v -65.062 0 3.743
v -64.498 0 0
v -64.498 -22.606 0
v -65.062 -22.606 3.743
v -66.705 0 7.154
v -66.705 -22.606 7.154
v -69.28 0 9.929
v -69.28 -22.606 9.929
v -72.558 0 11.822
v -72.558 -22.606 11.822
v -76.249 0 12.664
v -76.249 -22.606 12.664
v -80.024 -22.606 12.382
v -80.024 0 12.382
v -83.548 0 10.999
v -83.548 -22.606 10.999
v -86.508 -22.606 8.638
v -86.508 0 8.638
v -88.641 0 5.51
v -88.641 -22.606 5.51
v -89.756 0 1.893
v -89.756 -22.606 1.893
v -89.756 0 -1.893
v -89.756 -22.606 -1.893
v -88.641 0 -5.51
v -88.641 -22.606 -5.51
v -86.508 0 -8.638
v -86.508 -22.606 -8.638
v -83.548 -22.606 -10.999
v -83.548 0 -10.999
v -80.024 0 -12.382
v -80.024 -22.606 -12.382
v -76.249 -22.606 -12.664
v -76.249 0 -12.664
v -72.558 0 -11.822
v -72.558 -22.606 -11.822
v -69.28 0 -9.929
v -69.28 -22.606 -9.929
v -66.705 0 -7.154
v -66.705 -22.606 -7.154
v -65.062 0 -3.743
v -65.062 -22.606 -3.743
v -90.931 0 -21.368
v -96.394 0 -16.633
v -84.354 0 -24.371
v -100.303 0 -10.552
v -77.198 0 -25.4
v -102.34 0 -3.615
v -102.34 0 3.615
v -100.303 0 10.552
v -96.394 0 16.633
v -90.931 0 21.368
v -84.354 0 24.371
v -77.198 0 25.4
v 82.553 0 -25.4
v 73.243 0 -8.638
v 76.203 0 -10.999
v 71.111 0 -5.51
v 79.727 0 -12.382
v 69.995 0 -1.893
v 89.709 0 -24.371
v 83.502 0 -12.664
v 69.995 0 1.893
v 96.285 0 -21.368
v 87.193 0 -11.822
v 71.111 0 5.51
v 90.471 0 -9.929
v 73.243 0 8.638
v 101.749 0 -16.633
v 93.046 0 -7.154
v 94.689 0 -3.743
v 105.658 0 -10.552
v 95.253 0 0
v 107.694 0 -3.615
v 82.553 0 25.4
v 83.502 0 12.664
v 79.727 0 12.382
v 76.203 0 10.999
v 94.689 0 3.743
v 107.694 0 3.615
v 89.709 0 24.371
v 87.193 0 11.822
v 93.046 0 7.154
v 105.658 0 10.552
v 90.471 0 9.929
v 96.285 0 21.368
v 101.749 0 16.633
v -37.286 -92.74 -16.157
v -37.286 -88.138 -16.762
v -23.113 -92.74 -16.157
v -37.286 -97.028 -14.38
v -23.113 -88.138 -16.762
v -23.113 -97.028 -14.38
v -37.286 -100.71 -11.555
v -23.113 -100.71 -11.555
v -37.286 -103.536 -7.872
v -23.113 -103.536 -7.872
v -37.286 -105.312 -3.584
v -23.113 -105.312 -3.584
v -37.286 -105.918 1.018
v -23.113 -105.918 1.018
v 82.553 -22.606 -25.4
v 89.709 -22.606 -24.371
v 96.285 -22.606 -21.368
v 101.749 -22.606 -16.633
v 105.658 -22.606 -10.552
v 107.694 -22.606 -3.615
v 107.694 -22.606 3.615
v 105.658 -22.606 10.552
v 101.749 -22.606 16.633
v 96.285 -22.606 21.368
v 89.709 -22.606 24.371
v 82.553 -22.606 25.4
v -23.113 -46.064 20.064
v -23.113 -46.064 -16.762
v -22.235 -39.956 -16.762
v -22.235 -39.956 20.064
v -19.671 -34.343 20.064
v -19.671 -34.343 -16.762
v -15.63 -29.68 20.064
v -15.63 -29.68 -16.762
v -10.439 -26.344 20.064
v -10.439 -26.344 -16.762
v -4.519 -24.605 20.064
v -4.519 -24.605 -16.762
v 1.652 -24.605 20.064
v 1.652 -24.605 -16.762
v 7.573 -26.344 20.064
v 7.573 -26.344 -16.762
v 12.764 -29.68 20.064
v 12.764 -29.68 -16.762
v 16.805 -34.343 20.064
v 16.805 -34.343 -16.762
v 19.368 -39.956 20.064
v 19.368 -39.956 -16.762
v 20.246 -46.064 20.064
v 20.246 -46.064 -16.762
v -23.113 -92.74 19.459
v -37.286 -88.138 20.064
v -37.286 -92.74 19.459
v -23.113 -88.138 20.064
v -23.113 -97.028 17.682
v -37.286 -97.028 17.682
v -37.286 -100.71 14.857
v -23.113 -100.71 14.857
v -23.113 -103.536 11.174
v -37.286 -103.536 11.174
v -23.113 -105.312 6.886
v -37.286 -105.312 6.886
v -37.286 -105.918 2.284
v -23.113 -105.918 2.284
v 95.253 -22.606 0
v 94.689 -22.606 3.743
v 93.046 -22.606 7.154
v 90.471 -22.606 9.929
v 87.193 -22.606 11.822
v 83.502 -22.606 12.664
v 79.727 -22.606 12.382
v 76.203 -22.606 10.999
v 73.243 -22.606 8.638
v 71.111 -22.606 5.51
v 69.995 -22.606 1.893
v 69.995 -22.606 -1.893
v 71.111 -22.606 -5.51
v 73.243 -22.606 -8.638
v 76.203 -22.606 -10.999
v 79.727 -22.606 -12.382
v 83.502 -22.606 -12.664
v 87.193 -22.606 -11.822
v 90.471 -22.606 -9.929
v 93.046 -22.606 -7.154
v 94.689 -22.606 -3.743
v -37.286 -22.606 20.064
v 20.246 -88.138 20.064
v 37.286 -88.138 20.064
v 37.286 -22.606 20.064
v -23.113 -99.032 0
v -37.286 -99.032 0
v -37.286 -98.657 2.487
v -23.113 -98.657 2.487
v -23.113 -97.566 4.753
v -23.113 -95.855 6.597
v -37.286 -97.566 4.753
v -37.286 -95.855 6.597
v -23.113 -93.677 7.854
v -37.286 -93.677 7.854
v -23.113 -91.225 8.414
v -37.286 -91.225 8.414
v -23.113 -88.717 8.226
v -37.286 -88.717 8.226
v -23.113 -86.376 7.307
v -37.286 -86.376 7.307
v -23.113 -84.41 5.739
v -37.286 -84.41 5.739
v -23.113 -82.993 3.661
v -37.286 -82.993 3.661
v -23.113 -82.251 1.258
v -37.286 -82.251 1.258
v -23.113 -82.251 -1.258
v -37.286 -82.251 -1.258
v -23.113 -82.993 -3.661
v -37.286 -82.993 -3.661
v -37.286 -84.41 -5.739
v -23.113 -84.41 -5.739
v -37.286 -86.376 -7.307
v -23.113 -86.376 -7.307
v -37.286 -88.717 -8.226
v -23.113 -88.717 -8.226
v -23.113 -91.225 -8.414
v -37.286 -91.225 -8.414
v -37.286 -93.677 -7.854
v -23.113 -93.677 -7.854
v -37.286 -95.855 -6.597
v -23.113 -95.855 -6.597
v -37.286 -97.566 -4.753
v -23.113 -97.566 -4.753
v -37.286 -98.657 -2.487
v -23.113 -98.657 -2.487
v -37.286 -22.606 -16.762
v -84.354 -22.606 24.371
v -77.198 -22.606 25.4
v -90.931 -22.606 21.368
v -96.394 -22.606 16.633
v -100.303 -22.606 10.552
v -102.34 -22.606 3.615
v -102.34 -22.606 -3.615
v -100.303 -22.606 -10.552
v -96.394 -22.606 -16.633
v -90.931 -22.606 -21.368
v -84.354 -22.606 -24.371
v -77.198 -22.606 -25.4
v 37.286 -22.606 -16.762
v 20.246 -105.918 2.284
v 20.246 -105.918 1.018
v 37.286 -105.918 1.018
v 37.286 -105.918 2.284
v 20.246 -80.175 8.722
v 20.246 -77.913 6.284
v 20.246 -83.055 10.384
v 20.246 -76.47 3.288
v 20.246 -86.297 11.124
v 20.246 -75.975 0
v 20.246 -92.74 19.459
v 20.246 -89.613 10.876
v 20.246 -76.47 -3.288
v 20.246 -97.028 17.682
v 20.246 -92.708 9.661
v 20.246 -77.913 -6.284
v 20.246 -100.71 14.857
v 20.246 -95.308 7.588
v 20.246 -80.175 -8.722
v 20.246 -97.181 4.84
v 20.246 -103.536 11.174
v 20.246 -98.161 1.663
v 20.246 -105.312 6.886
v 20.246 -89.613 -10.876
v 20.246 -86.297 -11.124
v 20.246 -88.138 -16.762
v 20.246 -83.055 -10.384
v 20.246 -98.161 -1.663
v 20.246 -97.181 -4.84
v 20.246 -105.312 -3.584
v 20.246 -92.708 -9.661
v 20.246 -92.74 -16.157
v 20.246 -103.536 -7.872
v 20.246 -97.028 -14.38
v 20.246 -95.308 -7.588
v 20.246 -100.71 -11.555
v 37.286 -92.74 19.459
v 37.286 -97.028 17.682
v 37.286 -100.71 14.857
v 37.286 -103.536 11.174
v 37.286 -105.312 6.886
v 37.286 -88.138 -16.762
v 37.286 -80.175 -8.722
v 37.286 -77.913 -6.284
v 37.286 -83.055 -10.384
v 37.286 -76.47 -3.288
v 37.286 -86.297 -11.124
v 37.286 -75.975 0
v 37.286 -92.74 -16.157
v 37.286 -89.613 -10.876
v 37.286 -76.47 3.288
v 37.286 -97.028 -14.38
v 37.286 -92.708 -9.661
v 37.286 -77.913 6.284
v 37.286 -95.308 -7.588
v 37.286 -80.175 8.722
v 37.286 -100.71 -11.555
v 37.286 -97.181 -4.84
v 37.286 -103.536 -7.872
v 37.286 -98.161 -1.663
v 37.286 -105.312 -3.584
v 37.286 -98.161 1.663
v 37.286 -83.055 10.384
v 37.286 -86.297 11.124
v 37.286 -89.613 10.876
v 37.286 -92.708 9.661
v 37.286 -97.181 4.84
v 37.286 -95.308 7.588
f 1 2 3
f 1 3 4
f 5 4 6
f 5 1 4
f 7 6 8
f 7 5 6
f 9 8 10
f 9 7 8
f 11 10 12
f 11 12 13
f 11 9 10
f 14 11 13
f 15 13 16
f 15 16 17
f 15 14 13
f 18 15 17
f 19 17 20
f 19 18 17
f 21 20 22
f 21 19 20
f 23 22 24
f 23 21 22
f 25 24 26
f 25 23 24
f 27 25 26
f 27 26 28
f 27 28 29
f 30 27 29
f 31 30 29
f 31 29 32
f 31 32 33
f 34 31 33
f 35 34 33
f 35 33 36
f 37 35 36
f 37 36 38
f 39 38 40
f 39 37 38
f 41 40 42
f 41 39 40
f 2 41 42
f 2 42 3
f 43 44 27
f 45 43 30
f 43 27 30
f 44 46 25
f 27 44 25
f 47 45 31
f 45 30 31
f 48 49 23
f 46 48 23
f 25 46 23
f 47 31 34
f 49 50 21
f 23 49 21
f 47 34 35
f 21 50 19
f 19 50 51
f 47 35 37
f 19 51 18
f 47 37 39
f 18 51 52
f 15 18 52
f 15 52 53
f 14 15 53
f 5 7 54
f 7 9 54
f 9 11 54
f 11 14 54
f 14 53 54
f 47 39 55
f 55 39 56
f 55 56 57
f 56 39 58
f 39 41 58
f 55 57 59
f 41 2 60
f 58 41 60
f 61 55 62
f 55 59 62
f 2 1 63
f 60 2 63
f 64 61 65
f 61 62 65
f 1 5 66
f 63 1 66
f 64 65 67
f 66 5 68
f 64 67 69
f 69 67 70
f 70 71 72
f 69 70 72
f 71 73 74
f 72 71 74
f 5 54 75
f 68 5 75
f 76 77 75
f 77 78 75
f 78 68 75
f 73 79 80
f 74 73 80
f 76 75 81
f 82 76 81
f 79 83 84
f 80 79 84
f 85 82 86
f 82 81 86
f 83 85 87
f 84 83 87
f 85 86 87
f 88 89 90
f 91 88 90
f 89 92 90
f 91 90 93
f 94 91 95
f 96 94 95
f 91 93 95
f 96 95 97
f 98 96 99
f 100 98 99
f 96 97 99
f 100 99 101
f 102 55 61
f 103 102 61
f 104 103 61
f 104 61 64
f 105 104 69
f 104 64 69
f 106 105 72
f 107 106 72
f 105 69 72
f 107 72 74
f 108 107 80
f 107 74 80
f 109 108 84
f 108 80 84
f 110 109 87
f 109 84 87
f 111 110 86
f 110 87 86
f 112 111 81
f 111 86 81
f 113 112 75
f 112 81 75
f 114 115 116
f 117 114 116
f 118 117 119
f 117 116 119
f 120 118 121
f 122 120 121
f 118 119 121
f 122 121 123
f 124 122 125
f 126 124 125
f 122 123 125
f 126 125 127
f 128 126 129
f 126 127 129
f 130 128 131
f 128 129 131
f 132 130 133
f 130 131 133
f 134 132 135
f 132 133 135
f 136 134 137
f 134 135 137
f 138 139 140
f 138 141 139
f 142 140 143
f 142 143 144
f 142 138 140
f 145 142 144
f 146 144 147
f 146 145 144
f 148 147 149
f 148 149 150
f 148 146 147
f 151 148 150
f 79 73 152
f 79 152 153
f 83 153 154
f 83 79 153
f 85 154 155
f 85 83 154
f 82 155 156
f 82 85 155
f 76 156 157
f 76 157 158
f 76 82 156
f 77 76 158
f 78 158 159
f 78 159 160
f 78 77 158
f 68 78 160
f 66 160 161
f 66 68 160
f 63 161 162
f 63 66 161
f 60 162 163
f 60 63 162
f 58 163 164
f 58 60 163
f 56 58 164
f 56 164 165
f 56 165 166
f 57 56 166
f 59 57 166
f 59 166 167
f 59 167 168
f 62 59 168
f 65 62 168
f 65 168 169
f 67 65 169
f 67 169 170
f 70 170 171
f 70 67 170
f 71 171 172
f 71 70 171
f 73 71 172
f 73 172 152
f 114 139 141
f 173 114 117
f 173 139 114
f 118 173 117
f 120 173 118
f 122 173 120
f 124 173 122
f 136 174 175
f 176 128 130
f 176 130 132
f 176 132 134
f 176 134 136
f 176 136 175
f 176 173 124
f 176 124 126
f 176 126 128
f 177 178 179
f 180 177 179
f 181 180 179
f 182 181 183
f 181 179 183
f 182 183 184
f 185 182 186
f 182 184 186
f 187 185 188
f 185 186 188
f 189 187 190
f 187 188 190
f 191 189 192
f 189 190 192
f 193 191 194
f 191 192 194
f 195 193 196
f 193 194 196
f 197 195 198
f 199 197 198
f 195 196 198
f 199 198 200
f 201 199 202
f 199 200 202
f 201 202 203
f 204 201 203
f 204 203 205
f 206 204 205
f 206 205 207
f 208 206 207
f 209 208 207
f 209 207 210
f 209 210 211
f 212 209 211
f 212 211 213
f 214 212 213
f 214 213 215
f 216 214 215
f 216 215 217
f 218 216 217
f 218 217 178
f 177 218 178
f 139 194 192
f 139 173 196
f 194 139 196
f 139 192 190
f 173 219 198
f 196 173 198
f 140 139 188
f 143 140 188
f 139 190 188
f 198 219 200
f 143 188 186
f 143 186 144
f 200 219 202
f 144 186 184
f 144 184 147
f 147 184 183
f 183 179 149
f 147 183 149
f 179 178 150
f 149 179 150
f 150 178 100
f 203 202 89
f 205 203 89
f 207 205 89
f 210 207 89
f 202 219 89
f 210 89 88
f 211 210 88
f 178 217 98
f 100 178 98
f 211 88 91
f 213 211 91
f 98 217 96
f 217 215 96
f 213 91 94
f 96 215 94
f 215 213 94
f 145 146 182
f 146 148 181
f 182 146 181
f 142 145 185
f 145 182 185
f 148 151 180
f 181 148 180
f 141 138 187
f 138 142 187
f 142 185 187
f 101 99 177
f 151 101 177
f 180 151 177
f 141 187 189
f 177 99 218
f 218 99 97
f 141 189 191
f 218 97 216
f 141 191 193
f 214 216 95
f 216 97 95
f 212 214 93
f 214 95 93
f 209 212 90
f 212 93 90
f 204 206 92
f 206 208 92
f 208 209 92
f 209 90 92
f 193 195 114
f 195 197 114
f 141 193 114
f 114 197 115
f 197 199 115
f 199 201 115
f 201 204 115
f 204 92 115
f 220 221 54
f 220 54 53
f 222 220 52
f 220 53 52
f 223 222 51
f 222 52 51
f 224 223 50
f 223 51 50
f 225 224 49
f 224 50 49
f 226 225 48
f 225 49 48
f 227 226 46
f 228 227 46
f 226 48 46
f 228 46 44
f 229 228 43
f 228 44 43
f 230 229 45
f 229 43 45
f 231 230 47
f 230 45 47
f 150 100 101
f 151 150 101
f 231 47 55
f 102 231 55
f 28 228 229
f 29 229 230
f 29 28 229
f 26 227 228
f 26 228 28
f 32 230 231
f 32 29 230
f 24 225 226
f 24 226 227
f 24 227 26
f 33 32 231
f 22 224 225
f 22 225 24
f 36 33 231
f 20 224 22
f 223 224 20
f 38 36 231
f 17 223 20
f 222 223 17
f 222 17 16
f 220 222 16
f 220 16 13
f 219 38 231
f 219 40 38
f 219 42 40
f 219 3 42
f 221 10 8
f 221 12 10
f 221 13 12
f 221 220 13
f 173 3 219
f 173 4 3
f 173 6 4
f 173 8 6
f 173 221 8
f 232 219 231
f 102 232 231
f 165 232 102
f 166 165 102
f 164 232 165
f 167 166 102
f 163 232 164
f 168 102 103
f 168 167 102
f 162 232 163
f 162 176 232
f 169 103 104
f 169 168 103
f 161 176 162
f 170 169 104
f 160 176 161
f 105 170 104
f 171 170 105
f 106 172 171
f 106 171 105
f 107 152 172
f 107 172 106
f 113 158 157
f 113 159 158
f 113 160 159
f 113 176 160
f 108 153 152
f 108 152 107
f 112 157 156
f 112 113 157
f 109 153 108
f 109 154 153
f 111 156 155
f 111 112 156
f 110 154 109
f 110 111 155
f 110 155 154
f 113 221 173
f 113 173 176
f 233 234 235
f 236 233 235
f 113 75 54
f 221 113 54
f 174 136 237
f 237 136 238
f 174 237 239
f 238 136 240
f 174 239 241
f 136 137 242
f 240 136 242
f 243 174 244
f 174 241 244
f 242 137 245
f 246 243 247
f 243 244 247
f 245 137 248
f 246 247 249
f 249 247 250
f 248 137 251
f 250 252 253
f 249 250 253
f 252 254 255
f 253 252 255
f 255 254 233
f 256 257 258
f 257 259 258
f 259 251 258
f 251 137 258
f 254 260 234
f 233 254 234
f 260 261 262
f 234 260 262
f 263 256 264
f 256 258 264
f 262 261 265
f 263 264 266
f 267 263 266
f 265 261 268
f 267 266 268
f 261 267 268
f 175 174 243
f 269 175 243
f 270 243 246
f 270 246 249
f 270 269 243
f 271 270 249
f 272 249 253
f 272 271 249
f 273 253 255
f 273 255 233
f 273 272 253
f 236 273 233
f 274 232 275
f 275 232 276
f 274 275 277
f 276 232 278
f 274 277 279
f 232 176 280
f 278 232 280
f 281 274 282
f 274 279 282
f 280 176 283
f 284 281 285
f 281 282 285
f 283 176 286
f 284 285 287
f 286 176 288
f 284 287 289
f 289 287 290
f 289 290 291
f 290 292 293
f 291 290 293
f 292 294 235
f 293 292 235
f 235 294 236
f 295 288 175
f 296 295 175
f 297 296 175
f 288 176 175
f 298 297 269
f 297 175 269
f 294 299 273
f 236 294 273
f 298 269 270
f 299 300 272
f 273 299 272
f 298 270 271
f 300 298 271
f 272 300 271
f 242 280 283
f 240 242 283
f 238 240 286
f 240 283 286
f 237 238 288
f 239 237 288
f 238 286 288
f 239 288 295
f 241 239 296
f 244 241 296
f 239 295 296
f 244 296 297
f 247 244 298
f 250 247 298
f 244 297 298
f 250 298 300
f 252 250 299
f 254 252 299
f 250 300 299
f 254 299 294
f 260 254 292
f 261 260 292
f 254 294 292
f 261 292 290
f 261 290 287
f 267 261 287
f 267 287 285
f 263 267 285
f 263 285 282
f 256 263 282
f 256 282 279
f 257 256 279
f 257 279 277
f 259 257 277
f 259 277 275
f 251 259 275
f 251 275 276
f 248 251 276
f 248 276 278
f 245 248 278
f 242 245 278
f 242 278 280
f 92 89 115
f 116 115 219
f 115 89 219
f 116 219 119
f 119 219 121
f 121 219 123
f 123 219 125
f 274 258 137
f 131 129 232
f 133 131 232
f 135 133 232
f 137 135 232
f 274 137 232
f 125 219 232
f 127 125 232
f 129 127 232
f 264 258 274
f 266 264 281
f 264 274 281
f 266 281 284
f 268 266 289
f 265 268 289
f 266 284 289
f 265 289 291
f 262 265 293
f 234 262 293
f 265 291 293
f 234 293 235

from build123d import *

# Parameters (mm, degrees)
F0_R      = 12.7
F1_DEPTH  = 22.606
F2_W      = 74.5722576976
F2_H      = 22.3488807678
F3_DEPTH  = 83.312
F4_DEPTH  = 5.588
F5_DEPTH  = 8.89
F7_DEPTH  = 127.254
F8_R      = 8.4373748016
F9_DEPTH  = 25.4
F10_R     = 11.1555732281
F11_DEPTH = 25.4
F12_R     = 17.78
F13_R     = 17.78


with BuildPart() as f1:
    # F0 (on Front) → F1 (new body)
    with BuildSketch(Plane.XZ):
        with BuildLine():
            Line((82.5530235944, 25.4), (-77.1982306158, 25.4))
            ThreePointArc((-77.1982306158, 25.4), (-102.5982306158, 0), (-77.1982306158, -25.4))
            Line((-77.1982306158, -25.4), (82.5530235944, -25.4))
            ThreePointArc((82.5530235944, -25.4), (107.9530235944, 0), (82.5530235944, 25.4))
        make_face()
        with Locations((-77.1982306158, 0)):
            Circle(F0_R, mode=Mode.SUBTRACT)
        with Locations((82.5530235944, 0)):
            Circle(F0_R, mode=Mode.SUBTRACT)
    extrude(amount=F1_DEPTH)

    # F2 (on face) → F3 (join)
    with BuildSketch(Plane.XZ.offset(22.606)):
        Rectangle(F2_W, F2_H)
    extrude(amount=F3_DEPTH)

    # F4 (add): a face of the model
    f4_faces = [f1.faces().sort_by_distance(p)[0] for p in [
        (0, -64.262, -11.1744403839),
    ]]
    extrude(f4_faces, amount=F4_DEPTH)

    # F5 (add): a face of the model
    f5_faces = [f1.faces().sort_by_distance(p)[0] for p in [
        (0, -64.262, 11.1744403839),
    ]]
    extrude(f5_faces, amount=F5_DEPTH)

    # F6 (on face) → F7 (cut)
    with BuildSketch(Plane(origin=(0, 0, -16.7624403839), x_dir=(1, 0, 0), z_dir=(0, 0, -1))):
        with BuildLine():
            Line((20.2462481307, 105.918), (-23.1126956642, 105.918))
            Line((-23.1126956642, 105.918), (-23.1126956642, 46.0643023252))
            ThreePointArc((-23.1126956642, 46.0643023252), (-1.4332237667, 24.3848304278), (20.2462481307, 46.0643023252))
            Line((20.2462481307, 46.0643023252), (20.2462481307, 105.918))
        make_face()
    extrude(amount=-F7_DEPTH, mode=Mode.SUBTRACT)

    # F8 (on face) → F9 (cut)
    with BuildSketch(Plane(origin=(-37.2861288488, 0, 0), x_dir=(0, -1, 0), z_dir=(-1, 0, 0))):
        with Locations((90.5945748091, 0)):
            Circle(F8_R)
    extrude(amount=-F9_DEPTH, mode=Mode.SUBTRACT)

    # F10 (on face) → F11 (cut)
    with BuildSketch(Plane.YZ.offset(37.2861288488)):
        with Locations((-87.1303528547, 0)):
            Circle(F10_R)
    extrude(amount=-F11_DEPTH, mode=Mode.SUBTRACT)

    # F12
    f12_edges = [f1.edges().sort_by_distance(p)[0] for p in [
        (-30.199412, -105.918, -16.76244),
        (-30.199412, -105.918, 20.06444),
    ]]
    fillet(f12_edges, radius=F12_R)

    # F13
    f13_edges = [f1.edges().sort_by_distance(p)[0] for p in [
        (28.766188, -105.918, 20.06444),
        (28.766188, -105.918, -16.76244),
    ]]
    fillet(f13_edges, radius=F13_R)


solid = f1.part
